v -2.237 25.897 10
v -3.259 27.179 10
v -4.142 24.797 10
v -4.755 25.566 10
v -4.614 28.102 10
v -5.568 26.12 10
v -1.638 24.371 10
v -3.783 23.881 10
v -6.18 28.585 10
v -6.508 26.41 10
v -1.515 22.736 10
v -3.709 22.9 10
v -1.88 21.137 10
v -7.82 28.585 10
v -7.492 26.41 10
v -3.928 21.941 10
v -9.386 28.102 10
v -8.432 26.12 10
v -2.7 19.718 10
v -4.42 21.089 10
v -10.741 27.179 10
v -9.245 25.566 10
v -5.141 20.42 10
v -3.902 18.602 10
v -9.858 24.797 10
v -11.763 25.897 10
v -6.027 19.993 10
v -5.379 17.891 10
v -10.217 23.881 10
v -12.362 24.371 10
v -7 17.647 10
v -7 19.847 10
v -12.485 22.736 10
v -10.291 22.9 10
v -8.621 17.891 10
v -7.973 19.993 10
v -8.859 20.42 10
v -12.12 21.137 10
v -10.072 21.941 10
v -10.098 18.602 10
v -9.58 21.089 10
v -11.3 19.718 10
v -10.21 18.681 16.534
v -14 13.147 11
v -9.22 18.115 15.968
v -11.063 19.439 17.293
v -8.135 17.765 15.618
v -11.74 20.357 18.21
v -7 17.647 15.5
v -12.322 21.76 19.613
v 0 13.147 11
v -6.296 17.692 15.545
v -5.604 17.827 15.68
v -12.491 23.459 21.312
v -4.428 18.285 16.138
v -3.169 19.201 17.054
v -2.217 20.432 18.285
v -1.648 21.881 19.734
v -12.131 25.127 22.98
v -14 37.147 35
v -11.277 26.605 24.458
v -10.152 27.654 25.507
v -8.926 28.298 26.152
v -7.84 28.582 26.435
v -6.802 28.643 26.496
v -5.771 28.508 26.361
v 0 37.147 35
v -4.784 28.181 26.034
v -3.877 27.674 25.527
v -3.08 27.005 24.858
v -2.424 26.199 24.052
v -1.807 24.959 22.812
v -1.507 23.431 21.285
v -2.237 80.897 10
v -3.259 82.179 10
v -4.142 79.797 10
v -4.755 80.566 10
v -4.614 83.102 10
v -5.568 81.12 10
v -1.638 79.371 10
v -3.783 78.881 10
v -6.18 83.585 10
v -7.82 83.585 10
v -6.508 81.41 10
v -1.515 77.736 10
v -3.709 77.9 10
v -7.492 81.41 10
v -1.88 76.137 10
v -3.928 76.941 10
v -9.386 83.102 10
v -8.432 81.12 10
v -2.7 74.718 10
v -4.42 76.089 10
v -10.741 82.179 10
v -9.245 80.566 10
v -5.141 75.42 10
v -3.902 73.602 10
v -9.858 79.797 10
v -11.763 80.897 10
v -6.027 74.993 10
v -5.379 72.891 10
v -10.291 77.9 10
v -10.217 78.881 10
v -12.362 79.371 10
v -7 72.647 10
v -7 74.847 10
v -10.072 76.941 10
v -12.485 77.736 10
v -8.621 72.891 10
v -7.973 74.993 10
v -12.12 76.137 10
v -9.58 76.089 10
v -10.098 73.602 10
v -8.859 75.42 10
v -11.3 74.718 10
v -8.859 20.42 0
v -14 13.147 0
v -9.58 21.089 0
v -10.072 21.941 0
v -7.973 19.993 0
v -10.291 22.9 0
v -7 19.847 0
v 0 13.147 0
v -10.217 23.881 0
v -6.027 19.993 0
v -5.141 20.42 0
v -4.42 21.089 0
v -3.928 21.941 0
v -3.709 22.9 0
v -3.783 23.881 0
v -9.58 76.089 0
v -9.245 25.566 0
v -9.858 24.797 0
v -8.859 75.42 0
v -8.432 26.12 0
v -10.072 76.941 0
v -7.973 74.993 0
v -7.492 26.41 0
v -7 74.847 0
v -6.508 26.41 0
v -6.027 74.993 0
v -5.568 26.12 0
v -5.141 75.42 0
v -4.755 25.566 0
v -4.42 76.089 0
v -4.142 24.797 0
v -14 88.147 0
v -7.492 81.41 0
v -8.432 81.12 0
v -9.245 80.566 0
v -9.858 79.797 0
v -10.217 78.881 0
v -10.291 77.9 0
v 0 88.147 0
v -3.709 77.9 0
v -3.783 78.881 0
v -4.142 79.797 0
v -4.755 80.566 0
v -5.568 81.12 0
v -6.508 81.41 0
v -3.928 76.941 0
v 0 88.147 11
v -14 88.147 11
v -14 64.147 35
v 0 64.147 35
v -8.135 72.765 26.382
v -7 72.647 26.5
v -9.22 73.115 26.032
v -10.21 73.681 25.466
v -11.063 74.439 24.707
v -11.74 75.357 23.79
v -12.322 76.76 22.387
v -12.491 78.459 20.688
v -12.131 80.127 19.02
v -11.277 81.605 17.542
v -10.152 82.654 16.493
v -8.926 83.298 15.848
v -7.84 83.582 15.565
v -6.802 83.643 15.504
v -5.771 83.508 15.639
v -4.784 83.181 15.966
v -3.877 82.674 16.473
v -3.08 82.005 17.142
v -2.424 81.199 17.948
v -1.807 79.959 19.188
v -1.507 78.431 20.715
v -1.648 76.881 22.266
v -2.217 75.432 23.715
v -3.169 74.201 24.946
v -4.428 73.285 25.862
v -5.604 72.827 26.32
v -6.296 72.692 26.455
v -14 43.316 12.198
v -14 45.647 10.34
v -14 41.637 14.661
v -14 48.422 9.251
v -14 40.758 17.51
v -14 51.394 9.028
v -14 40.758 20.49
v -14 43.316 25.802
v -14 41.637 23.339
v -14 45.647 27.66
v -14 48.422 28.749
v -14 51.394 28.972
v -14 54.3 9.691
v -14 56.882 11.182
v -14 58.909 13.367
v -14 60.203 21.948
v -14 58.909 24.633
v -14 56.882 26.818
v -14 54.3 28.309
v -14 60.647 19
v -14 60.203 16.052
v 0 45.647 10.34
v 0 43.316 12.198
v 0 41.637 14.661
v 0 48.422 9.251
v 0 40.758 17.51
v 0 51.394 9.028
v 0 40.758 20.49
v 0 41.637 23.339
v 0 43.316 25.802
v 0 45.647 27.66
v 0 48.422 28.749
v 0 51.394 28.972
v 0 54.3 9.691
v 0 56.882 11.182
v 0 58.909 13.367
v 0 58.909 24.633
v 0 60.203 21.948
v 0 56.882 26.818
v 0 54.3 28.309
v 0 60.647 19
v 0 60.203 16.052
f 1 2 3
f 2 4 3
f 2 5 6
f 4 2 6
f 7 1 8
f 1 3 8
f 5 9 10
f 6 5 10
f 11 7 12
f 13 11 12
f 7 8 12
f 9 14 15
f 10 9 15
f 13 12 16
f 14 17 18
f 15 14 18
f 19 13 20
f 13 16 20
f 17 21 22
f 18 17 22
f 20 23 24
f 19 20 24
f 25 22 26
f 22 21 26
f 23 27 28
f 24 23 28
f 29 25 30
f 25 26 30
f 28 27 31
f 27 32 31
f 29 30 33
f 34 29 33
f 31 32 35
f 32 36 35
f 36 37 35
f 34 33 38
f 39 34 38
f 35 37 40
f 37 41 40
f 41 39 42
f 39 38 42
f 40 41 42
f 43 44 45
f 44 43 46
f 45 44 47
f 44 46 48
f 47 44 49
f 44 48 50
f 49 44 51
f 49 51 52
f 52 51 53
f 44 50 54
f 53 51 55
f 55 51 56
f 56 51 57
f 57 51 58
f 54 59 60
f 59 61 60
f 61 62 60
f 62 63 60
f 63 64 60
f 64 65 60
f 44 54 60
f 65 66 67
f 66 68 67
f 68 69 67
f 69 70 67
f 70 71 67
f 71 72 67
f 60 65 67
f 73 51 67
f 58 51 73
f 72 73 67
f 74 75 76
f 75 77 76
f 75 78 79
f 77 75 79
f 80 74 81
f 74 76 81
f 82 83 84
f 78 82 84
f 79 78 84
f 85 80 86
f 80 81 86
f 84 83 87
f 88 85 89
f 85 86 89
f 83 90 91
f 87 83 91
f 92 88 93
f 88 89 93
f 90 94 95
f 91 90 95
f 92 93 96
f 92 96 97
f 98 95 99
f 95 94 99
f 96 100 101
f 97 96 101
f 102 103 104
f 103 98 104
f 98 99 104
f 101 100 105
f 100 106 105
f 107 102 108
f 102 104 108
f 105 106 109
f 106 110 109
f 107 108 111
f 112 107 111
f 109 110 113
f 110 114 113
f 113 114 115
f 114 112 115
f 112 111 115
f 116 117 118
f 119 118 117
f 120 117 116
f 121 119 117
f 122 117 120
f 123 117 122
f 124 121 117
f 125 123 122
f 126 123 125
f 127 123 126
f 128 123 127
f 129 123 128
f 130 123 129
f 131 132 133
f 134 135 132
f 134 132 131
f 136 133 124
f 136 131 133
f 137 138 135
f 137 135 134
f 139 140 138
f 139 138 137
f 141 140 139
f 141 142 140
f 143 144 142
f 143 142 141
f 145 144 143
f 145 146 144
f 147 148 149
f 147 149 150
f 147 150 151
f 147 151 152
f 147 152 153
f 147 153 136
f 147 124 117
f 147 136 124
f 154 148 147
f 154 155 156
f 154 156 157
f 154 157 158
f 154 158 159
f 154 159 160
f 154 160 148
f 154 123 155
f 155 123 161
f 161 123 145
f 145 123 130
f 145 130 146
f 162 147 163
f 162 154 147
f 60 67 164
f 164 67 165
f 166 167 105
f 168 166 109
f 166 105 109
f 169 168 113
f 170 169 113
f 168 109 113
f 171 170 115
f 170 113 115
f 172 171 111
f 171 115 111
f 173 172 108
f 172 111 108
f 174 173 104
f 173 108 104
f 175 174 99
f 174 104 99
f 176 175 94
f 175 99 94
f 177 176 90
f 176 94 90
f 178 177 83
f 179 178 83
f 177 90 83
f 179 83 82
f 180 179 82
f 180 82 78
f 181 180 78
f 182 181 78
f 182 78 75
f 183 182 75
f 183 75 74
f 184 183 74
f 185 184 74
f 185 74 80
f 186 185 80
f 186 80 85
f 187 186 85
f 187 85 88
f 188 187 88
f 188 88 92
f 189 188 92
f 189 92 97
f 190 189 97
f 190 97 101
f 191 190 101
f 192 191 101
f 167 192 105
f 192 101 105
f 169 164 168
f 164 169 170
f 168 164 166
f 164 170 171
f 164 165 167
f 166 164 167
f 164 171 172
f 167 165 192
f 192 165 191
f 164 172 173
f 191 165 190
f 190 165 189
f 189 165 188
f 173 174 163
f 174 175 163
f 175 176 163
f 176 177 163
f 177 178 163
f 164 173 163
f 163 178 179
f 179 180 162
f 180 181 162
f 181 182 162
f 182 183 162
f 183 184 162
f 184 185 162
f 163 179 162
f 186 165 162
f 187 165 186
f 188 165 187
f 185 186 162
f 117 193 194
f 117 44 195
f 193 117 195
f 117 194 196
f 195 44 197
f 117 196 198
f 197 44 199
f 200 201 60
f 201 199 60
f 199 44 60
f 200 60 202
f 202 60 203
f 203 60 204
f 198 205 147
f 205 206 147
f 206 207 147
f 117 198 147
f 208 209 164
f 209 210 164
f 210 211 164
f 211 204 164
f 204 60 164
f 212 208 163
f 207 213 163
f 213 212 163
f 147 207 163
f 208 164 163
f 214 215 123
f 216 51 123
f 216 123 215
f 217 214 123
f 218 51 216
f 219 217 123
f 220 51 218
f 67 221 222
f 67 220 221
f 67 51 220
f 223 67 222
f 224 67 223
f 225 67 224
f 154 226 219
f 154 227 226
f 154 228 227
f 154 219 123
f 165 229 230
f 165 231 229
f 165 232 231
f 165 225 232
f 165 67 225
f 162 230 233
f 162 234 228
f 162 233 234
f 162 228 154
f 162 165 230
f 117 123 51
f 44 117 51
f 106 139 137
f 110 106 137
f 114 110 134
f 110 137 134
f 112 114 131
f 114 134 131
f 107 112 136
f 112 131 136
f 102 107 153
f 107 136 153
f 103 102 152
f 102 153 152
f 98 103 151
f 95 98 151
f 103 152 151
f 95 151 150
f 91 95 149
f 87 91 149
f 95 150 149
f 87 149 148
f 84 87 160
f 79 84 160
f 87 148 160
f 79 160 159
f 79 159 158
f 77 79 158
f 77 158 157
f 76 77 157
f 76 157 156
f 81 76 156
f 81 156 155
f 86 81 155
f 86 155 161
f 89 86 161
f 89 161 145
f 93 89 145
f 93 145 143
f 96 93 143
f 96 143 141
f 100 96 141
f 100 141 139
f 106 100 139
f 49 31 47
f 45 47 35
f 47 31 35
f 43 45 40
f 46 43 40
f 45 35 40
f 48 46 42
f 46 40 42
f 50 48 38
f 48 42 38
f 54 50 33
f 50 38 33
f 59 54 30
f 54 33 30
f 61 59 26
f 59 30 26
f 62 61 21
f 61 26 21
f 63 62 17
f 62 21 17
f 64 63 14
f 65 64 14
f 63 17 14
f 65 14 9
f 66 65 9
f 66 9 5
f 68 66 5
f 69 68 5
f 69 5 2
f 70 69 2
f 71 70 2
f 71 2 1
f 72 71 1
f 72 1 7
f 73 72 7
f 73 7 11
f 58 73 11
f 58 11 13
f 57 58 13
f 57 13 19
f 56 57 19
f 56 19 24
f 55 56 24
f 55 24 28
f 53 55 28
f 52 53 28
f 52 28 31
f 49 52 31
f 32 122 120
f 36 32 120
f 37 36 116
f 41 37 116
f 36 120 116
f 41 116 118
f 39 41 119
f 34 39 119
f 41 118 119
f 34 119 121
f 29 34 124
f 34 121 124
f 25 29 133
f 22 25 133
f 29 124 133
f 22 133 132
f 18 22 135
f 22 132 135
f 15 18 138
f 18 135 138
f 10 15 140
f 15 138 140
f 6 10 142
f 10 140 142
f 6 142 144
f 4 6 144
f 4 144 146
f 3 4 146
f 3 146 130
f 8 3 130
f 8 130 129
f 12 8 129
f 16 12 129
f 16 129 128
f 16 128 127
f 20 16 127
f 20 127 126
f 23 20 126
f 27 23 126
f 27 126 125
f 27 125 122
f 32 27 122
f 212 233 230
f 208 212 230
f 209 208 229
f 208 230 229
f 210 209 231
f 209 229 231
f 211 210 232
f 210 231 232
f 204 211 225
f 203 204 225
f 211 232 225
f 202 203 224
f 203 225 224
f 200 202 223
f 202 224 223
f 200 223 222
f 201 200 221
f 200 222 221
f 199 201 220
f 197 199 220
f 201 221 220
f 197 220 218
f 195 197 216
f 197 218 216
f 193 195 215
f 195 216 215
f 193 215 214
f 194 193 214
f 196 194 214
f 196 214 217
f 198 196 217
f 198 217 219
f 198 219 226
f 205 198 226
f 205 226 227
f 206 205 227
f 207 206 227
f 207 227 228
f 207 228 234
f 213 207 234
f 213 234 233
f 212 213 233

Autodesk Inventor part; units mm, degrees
ref_plane "YZ Plane" through (0, 0, 0) normal (1, 0, 0) x (0, 1, 0)
ref_plane "XZ Plane" through (0, 0, 0) normal (0, 1, 0) x (-1, 0, 0)
ref_plane "XY Plane" through (0, 0, 0) normal (0, 0, 1) x (1, 0, 0)
sketch "Sketch1" plane through (0, 0, 0) normal (0, 0, 1) x (1, 0, 0)
  point P0 (0, 0)
sketch "Sketch2" plane through (0, 0, 0) normal (1, 0, 0) x (0, 1, 0)
  line L0 (13.1468, 0) -> (76.0129, 0) projected
  line L1 (13.1468, 0) -> (88.1468, 0)
  circle A0 centre (50.6468, 19) radius 10
  line L2 (13.1468, 35) -> (88.1468, 35)
  line L3 (13.1468, 0) -> (13.1468, 35)
  line L4 (88.1468, 0) -> (88.1468, 35)
  point P0 (0, 0)
  point P1 (90.0129, 0)
  dimension "d0" = 75
  dimension "d1" = 20
  dimension "d3" = 16
  dimension "d5" = 35
  dimension "d8" = 37.5
extrude "Extrusion1" add sketch "Sketch2" against normal blind 14
sketch "Sketch3" plane through (0, 13.1468, 35) normal (0, 0, 1) x (1, 0, 0)
  line L0 (0, 75) -> (0, 0) projected
  line L1 (0, 75) -> (-14, 75) projected
  line L2 (-14, 0) -> (-14, 75) projected
  line L3 (0, 0) -> (-14, 0) projected
  line L4 (0, 75) -> (0, 0) projected
  line L5 (0, 37.5) -> (-14, 37.5)
  point P0 (0, -13.1468)
  point P1 (-7, 10)
  point P2 (-7, 65)
  dimension "d12" = 7
  dimension "d13" = 14
  dimension "d14" = 10
hole "Hole1" at (-7, 23.1468, 35) at (-7, 78.1468, 35) direction (0, 0, -1) diameter 6.6 end through all counterbore diameter 11 counterbore depth 25 clearance for "Socket Head Cap Screw ISO 4762" size "M6" standard "ISO"
chamfer "Chamfer1" distance 24 angle 45 2 edges at (-7, 13.1468, 35) (-7, 88.1468, 35)
equation "\"d8\" = 0.5 * d0"
equation "\"d12\" = 0.5 * d13"
properties part number "Glidelejrehus" material "Steel, Galvanized"
